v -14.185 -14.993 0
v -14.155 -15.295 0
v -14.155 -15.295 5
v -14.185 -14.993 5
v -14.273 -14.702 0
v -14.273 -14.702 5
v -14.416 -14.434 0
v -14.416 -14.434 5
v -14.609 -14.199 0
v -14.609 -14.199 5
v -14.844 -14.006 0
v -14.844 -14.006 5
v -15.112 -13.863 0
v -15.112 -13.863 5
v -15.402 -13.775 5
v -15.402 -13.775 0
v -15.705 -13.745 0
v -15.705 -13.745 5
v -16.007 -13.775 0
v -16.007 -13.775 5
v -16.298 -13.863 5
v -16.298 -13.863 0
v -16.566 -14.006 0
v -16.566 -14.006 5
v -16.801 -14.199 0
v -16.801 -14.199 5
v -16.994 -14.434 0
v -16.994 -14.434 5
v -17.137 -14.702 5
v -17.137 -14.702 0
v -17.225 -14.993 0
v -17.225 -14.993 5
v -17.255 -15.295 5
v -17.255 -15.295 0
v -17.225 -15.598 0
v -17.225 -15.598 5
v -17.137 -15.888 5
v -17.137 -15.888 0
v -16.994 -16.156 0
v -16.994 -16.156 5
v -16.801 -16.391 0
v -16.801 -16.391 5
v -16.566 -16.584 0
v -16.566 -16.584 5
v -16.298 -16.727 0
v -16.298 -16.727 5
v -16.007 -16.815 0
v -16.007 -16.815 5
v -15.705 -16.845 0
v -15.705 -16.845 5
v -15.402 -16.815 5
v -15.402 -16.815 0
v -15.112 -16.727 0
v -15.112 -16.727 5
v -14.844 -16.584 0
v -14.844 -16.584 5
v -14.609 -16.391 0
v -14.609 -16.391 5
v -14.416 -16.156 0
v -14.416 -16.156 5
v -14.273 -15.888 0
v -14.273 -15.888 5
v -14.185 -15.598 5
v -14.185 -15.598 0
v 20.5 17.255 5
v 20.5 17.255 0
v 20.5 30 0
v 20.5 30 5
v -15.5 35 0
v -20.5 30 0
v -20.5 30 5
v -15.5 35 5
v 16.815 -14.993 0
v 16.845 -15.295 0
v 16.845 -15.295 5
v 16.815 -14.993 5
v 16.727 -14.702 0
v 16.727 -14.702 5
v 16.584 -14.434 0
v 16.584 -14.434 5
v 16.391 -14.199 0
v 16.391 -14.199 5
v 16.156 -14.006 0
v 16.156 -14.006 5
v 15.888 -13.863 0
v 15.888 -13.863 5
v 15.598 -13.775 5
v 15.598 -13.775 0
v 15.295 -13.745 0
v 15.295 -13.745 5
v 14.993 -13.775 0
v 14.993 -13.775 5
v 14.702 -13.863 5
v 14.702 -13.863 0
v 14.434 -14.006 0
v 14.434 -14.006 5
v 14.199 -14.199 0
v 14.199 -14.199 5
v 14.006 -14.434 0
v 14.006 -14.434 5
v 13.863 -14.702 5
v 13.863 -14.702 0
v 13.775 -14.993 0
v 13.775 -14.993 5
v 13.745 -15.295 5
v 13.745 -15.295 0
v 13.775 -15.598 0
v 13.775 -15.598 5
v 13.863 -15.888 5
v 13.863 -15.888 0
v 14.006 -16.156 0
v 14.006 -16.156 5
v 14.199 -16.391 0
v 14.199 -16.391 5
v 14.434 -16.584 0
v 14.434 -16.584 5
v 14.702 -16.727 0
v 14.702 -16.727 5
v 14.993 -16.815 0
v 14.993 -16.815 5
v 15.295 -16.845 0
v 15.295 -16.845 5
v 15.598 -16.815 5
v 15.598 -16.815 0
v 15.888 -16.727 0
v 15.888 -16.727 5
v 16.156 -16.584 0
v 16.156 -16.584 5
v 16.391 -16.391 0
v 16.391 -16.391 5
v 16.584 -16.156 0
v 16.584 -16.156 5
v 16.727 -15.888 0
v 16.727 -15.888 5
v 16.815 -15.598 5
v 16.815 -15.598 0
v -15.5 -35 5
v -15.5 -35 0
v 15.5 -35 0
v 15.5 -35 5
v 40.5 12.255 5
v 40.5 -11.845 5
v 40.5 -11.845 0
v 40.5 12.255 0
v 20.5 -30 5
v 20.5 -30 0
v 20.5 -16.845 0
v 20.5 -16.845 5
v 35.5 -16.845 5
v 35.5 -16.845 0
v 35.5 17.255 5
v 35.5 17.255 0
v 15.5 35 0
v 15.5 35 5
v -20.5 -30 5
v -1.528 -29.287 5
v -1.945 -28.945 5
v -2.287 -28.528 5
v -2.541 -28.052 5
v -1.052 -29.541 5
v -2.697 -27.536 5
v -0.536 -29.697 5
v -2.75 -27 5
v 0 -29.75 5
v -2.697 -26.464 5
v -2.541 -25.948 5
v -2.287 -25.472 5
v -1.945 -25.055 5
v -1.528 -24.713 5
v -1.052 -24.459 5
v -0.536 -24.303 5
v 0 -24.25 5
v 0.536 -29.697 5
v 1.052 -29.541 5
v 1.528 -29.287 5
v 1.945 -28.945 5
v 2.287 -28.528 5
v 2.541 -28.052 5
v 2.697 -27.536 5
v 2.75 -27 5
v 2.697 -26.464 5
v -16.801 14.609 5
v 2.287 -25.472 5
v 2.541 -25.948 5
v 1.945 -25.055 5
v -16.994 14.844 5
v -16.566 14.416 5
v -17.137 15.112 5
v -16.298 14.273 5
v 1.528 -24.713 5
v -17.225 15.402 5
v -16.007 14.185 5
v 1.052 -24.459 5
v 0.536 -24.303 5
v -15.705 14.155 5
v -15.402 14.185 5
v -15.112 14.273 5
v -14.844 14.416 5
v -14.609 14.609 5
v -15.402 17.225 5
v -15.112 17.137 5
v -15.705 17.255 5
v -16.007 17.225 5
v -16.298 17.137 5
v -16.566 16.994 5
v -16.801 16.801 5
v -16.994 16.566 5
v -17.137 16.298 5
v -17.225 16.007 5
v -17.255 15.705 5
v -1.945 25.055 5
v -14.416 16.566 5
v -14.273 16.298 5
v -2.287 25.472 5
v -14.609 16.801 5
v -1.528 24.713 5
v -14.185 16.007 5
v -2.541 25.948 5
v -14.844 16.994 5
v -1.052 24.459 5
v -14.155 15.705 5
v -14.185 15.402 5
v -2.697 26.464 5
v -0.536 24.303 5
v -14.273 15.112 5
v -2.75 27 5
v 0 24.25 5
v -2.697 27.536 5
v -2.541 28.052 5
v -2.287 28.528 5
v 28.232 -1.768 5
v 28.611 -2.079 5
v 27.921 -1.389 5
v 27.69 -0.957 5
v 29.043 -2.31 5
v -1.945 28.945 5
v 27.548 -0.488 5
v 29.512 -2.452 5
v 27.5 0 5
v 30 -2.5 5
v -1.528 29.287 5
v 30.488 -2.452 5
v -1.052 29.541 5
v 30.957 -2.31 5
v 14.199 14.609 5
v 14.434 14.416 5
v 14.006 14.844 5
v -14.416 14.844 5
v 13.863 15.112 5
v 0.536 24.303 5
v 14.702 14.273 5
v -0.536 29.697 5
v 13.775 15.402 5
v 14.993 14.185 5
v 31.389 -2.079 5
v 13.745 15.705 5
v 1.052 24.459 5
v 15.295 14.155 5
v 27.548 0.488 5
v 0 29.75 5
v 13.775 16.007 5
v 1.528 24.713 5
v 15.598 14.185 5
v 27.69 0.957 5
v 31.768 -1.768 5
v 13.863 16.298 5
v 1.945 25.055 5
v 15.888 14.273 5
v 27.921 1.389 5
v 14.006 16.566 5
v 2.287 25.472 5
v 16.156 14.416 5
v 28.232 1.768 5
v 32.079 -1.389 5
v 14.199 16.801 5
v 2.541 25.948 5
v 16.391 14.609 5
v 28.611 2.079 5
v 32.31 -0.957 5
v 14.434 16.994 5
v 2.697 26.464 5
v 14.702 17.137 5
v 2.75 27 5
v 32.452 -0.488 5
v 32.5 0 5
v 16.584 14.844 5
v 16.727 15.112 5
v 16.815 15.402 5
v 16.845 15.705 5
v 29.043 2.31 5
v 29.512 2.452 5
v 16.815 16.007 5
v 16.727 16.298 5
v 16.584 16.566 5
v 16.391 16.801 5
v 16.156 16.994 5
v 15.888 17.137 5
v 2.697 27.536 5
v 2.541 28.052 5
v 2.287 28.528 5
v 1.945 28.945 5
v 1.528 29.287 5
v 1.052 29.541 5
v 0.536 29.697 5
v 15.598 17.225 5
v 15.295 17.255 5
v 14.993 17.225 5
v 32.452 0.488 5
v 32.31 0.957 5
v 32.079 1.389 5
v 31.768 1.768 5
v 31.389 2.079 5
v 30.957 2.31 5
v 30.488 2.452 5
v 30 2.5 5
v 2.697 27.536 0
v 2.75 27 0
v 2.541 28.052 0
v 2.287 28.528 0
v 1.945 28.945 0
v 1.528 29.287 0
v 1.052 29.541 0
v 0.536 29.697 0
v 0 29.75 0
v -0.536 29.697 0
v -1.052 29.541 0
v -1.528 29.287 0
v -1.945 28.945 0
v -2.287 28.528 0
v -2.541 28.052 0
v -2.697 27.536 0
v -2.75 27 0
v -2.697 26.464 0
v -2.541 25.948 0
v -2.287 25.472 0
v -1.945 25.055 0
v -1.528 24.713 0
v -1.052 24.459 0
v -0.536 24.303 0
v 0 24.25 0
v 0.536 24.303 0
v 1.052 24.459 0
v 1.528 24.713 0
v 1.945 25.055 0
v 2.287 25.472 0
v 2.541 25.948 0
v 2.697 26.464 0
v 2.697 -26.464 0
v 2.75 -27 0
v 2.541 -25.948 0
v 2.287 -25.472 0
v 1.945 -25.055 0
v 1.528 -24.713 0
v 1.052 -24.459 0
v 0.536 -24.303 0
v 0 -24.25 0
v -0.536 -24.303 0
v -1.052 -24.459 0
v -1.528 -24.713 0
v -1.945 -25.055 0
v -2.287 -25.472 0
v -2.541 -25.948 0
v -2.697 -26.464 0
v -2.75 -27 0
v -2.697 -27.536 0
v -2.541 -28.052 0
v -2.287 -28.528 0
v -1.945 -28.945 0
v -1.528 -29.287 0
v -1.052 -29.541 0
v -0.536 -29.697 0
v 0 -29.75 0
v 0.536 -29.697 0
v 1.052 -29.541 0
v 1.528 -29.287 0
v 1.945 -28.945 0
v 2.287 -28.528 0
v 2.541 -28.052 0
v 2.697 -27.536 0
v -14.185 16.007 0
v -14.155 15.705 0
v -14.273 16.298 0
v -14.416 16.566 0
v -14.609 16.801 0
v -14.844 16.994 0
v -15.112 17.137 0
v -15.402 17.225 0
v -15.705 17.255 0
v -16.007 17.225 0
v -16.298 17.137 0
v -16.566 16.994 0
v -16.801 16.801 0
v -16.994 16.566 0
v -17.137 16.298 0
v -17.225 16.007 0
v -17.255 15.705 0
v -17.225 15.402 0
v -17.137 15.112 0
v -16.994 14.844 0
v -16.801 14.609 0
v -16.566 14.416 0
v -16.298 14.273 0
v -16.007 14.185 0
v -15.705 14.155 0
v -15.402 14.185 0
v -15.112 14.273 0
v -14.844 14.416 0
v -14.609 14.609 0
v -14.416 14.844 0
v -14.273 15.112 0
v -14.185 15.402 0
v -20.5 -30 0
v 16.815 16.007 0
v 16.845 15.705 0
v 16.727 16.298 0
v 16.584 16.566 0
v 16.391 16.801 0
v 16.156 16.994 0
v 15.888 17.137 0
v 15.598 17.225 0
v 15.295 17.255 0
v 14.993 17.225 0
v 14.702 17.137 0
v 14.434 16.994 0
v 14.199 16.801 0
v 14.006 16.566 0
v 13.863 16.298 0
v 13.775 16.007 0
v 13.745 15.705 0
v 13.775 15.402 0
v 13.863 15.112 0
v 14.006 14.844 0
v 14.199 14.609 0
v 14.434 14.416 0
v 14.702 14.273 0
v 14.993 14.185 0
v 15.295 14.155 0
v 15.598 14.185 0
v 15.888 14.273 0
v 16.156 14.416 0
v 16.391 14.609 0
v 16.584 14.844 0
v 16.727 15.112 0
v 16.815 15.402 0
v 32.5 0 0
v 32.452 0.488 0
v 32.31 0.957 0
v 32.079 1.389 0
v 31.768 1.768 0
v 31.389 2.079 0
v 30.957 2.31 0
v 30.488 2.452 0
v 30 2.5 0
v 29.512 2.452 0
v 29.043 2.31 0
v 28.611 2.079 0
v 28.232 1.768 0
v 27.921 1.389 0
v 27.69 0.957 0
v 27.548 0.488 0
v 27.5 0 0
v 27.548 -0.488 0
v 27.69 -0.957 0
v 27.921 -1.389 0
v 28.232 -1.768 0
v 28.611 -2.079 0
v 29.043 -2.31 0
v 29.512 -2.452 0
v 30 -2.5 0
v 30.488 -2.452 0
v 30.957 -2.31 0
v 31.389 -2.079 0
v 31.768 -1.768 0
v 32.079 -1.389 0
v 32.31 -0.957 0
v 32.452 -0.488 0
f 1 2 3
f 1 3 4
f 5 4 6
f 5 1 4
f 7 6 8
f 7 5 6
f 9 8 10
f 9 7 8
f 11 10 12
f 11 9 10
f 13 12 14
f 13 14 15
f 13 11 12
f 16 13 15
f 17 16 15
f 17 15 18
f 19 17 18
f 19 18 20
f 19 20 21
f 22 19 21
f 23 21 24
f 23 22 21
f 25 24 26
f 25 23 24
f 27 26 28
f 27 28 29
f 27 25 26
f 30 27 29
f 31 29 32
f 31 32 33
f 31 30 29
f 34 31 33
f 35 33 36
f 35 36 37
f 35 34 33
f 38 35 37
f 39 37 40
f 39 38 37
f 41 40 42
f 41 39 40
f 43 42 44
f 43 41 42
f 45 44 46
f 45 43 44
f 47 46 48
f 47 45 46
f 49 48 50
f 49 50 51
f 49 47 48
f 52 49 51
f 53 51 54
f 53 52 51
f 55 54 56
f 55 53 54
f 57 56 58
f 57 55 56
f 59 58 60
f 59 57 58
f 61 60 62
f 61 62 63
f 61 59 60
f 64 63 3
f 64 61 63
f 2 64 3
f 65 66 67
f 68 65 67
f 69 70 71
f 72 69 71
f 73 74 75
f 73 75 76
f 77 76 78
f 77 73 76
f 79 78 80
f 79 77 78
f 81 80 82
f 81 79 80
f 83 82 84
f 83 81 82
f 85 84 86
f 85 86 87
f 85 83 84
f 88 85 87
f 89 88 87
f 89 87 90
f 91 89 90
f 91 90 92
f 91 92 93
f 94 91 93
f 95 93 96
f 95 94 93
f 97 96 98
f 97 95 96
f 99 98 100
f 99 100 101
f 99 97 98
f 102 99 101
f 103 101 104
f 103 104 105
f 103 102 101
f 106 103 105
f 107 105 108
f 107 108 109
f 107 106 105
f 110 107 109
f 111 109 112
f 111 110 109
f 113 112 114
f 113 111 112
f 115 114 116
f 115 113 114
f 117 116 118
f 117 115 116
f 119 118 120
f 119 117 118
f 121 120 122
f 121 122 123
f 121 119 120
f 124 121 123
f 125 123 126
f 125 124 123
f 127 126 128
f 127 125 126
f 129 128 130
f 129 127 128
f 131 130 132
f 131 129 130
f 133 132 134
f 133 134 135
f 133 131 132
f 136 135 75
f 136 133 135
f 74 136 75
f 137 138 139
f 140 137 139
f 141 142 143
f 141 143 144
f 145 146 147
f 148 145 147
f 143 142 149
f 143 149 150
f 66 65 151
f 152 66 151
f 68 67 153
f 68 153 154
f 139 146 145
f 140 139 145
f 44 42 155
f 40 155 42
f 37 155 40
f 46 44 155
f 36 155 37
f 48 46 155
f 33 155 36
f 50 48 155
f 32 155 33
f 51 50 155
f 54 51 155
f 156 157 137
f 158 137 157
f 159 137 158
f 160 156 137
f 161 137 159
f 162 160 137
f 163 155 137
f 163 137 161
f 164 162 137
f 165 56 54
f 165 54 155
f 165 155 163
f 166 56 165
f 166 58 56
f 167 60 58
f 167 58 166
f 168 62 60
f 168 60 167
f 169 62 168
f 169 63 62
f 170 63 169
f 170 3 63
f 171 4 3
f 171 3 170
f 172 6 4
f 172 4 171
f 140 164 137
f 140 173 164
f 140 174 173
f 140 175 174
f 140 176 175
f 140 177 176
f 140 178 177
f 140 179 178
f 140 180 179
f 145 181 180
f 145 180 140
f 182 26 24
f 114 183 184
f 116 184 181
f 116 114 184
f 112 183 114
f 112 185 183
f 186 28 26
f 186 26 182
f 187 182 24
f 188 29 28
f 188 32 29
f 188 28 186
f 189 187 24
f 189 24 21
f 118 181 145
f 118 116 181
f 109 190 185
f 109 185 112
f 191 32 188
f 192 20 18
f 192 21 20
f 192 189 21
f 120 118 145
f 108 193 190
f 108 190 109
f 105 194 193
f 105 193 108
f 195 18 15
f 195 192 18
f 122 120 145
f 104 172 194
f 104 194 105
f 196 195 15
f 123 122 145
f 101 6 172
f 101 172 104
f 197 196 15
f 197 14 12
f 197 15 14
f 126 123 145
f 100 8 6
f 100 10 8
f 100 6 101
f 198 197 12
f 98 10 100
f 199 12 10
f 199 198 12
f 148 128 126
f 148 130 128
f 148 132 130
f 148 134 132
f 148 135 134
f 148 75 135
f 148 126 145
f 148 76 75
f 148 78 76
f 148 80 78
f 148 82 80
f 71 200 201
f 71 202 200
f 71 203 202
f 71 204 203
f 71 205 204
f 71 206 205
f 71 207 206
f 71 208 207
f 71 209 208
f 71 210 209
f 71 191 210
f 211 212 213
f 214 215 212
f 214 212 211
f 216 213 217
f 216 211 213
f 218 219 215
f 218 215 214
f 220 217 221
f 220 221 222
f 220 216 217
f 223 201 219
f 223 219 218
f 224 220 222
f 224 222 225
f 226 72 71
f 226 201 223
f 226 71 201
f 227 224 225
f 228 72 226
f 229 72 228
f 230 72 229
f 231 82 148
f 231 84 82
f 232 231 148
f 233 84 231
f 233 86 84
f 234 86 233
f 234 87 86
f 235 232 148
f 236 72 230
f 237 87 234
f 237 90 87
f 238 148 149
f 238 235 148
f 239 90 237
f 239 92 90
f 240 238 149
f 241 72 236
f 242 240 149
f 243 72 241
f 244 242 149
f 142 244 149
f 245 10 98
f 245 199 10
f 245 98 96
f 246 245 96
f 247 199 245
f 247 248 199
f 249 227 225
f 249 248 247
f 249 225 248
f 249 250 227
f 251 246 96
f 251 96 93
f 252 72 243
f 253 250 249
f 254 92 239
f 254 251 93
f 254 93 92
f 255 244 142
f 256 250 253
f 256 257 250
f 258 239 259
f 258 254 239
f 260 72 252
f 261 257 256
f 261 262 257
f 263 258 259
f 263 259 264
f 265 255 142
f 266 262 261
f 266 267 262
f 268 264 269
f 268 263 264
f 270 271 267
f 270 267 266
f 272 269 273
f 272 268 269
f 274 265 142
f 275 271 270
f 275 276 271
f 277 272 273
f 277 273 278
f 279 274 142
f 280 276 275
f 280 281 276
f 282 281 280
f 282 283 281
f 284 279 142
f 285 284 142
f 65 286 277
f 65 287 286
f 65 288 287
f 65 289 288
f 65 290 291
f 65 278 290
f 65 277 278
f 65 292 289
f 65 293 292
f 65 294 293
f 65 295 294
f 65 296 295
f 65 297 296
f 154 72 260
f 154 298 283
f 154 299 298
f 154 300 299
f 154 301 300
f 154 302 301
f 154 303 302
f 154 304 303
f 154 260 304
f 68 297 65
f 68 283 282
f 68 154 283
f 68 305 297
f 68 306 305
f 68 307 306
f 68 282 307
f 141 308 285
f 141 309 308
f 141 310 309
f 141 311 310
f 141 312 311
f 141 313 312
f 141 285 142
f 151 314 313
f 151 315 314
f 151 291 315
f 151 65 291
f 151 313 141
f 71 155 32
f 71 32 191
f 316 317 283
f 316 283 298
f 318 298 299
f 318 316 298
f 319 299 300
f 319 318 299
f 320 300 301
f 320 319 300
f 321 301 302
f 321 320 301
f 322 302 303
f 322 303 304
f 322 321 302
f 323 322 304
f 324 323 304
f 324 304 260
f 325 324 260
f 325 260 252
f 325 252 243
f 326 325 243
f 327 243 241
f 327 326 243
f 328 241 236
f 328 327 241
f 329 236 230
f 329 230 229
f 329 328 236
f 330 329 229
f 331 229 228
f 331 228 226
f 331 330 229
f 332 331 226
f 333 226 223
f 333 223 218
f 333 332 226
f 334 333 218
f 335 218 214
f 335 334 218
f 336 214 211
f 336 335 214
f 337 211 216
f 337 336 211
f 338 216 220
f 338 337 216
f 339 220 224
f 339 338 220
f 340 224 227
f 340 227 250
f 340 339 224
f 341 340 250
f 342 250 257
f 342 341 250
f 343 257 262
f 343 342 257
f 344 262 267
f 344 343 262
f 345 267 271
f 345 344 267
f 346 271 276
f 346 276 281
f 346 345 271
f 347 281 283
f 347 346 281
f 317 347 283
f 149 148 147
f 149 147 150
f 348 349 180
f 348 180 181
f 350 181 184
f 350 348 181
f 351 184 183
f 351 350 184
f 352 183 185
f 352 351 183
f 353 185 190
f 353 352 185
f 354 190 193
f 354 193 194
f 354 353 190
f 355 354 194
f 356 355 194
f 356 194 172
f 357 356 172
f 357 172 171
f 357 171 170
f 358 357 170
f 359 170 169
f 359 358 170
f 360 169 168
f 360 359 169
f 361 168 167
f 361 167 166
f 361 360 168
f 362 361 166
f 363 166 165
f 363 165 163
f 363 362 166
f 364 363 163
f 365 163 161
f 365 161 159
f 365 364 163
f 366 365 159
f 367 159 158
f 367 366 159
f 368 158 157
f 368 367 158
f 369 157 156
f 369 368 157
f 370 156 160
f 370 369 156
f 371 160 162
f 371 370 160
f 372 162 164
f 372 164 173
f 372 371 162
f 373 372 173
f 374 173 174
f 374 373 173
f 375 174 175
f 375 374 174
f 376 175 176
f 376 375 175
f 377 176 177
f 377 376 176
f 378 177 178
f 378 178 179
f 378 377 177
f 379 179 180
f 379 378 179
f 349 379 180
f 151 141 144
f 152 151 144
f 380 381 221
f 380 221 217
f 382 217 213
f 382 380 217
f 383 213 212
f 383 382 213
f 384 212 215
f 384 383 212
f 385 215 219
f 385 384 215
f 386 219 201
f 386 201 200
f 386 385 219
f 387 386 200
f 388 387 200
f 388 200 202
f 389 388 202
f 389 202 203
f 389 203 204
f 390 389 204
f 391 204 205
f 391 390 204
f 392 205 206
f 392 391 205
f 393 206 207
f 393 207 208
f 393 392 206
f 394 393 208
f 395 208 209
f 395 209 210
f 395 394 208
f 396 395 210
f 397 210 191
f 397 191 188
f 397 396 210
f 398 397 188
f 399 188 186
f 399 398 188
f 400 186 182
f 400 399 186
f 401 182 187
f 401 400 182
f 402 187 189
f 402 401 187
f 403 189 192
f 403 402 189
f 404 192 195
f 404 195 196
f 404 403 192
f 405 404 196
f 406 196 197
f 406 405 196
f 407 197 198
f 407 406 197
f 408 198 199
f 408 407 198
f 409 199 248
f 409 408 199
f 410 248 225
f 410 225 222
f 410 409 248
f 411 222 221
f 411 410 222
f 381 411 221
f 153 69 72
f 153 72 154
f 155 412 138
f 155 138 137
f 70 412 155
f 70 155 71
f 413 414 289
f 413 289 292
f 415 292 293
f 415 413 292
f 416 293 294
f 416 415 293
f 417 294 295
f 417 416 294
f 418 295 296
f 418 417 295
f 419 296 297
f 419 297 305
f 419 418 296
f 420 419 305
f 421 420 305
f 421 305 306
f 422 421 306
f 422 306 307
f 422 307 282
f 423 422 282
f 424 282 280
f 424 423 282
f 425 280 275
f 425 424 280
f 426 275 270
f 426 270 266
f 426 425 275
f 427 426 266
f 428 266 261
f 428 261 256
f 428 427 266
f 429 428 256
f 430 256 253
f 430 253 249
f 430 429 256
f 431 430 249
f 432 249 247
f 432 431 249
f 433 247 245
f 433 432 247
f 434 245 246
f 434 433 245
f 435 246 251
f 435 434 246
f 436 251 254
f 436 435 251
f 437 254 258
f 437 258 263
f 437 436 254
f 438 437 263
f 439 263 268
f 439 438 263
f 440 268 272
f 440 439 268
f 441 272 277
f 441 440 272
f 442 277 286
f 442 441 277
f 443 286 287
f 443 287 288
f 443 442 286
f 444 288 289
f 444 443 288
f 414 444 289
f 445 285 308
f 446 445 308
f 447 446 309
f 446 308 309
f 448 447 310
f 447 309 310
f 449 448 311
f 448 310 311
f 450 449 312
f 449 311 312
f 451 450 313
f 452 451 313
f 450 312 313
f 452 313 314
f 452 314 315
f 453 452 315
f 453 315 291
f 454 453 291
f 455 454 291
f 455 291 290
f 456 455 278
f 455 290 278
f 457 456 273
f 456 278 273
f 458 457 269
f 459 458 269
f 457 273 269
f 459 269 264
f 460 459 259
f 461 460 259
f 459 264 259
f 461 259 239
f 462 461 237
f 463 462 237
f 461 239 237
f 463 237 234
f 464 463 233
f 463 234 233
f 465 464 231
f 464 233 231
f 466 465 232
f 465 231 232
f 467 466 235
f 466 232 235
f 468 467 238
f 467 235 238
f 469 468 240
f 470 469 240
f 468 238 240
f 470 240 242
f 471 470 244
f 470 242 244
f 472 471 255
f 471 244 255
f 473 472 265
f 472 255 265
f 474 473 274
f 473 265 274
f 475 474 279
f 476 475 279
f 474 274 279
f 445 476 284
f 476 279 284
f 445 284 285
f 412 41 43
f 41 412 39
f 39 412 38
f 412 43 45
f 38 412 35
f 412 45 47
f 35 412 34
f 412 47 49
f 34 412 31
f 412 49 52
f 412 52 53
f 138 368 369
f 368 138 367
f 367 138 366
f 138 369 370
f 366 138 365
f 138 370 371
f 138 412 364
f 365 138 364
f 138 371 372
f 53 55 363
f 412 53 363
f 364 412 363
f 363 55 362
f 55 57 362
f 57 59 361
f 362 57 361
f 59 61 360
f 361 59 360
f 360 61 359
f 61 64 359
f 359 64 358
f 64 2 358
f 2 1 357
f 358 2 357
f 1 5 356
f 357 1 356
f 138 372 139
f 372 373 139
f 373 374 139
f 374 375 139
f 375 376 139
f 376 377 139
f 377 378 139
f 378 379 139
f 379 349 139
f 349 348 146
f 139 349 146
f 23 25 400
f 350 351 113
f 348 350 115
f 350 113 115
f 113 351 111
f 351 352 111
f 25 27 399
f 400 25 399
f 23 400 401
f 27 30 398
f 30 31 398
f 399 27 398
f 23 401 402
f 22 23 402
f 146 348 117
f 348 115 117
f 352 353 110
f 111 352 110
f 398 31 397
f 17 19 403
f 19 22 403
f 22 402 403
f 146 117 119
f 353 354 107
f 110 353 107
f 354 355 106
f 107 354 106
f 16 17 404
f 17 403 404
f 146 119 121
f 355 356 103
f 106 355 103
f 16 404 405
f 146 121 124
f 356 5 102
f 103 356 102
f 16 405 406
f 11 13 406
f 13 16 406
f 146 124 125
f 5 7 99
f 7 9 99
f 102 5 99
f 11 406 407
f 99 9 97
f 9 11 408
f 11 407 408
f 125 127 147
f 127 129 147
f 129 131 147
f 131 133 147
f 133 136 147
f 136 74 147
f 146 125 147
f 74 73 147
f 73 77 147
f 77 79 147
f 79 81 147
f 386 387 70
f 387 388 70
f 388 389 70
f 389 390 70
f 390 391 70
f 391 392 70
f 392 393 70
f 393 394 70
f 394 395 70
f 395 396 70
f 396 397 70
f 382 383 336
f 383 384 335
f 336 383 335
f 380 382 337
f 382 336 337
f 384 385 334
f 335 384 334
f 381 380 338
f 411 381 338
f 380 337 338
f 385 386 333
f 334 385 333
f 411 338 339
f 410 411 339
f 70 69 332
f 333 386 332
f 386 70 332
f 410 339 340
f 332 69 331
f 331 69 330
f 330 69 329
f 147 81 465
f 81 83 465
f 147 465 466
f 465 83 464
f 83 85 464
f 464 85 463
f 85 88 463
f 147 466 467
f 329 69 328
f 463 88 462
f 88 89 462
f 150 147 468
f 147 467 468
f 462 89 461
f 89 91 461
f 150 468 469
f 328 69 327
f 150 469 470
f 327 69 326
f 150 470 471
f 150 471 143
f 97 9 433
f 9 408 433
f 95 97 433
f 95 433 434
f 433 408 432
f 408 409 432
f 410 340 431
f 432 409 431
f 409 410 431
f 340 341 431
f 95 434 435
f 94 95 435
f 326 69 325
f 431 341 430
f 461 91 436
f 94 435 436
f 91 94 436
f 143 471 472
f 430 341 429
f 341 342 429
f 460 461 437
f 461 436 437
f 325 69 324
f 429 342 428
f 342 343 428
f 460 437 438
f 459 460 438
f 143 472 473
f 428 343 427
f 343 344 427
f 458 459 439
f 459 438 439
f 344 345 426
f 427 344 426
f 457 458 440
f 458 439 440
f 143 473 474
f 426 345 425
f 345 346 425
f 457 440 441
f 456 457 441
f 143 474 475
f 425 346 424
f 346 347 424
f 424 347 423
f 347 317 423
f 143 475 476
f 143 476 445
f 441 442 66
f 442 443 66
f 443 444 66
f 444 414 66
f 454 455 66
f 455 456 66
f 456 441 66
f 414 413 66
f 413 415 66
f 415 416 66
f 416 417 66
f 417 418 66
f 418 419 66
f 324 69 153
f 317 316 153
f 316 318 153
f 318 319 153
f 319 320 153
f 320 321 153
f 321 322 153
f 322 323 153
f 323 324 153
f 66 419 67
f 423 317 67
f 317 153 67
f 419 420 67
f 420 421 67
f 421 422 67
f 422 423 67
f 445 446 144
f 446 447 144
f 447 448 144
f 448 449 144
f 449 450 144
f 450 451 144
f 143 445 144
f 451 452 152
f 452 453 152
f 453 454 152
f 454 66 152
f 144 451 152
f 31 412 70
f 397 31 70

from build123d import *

# Parameters (mm, degrees)
SKETCH1_W           = 41
SKETCH1_H           = 70
SKETCH1_R           = 1.55
SKETCH1_R_2         = 2.75
BOSS_EXTRUDE1_DEPTH = 5
CHAMFER1_SIZE       = 5
SKETCH2_W           = 20
SKETCH2_H           = 34.1
SKETCH2_R           = 2.5
BOSS_EXTRUDE2_DEPTH = 5
CHAMFER2_SIZE       = 5


with BuildPart() as part:
    # Sketch1 → Boss-Extrude1 (new body)
    with BuildSketch(Plane.XY):
        Rectangle(SKETCH1_W, SKETCH1_H)
        with Locations((-15.704778157, -15.295221843)):
            Circle(SKETCH1_R, mode=Mode.SUBTRACT)
        with Locations((15.295221843, -15.295221843)):
            Circle(SKETCH1_R, mode=Mode.SUBTRACT)
        with Locations((15.295221843, 15.704778157)):
            Circle(SKETCH1_R, mode=Mode.SUBTRACT)
        with Locations((-15.704778157, 15.704778157)):
            Circle(SKETCH1_R, mode=Mode.SUBTRACT)
        with Locations((0, 27)):
            Circle(SKETCH1_R_2, mode=Mode.SUBTRACT)
        with Locations((0, -27)):
            Circle(SKETCH1_R_2, mode=Mode.SUBTRACT)
    extrude(amount=BOSS_EXTRUDE1_DEPTH)

    # Chamfer1
    chamfer1_edges = [part.edges().sort_by_distance(p)[0] for p in [
        (-20.5, 35, 2.5),
        (20.5, 35, 2.5),
        (20.5, -35, 2.5),
        (-20.5, -35, 2.5),
    ]]
    chamfer(chamfer1_edges, length=CHAMFER1_SIZE)

    # Sketch2 → Boss-Extrude2 (add)
    with BuildSketch(Plane.XY.offset(5)):
        with Locations((30.5, 0.204778157)):
            Rectangle(SKETCH2_W, SKETCH2_H)
        with Locations((30, 0)):
            Circle(SKETCH2_R, mode=Mode.SUBTRACT)
    extrude(amount=-BOSS_EXTRUDE2_DEPTH)

    # Chamfer2
    chamfer2_edges = [part.edges().sort_by_distance(p)[0] for p in [
        (40.5, 17.254778157, 2.5),
        (40.5, -16.845221843, 2.5),
    ]]
    chamfer(chamfer2_edges, length=CHAMFER2_SIZE)


solid = part.part
